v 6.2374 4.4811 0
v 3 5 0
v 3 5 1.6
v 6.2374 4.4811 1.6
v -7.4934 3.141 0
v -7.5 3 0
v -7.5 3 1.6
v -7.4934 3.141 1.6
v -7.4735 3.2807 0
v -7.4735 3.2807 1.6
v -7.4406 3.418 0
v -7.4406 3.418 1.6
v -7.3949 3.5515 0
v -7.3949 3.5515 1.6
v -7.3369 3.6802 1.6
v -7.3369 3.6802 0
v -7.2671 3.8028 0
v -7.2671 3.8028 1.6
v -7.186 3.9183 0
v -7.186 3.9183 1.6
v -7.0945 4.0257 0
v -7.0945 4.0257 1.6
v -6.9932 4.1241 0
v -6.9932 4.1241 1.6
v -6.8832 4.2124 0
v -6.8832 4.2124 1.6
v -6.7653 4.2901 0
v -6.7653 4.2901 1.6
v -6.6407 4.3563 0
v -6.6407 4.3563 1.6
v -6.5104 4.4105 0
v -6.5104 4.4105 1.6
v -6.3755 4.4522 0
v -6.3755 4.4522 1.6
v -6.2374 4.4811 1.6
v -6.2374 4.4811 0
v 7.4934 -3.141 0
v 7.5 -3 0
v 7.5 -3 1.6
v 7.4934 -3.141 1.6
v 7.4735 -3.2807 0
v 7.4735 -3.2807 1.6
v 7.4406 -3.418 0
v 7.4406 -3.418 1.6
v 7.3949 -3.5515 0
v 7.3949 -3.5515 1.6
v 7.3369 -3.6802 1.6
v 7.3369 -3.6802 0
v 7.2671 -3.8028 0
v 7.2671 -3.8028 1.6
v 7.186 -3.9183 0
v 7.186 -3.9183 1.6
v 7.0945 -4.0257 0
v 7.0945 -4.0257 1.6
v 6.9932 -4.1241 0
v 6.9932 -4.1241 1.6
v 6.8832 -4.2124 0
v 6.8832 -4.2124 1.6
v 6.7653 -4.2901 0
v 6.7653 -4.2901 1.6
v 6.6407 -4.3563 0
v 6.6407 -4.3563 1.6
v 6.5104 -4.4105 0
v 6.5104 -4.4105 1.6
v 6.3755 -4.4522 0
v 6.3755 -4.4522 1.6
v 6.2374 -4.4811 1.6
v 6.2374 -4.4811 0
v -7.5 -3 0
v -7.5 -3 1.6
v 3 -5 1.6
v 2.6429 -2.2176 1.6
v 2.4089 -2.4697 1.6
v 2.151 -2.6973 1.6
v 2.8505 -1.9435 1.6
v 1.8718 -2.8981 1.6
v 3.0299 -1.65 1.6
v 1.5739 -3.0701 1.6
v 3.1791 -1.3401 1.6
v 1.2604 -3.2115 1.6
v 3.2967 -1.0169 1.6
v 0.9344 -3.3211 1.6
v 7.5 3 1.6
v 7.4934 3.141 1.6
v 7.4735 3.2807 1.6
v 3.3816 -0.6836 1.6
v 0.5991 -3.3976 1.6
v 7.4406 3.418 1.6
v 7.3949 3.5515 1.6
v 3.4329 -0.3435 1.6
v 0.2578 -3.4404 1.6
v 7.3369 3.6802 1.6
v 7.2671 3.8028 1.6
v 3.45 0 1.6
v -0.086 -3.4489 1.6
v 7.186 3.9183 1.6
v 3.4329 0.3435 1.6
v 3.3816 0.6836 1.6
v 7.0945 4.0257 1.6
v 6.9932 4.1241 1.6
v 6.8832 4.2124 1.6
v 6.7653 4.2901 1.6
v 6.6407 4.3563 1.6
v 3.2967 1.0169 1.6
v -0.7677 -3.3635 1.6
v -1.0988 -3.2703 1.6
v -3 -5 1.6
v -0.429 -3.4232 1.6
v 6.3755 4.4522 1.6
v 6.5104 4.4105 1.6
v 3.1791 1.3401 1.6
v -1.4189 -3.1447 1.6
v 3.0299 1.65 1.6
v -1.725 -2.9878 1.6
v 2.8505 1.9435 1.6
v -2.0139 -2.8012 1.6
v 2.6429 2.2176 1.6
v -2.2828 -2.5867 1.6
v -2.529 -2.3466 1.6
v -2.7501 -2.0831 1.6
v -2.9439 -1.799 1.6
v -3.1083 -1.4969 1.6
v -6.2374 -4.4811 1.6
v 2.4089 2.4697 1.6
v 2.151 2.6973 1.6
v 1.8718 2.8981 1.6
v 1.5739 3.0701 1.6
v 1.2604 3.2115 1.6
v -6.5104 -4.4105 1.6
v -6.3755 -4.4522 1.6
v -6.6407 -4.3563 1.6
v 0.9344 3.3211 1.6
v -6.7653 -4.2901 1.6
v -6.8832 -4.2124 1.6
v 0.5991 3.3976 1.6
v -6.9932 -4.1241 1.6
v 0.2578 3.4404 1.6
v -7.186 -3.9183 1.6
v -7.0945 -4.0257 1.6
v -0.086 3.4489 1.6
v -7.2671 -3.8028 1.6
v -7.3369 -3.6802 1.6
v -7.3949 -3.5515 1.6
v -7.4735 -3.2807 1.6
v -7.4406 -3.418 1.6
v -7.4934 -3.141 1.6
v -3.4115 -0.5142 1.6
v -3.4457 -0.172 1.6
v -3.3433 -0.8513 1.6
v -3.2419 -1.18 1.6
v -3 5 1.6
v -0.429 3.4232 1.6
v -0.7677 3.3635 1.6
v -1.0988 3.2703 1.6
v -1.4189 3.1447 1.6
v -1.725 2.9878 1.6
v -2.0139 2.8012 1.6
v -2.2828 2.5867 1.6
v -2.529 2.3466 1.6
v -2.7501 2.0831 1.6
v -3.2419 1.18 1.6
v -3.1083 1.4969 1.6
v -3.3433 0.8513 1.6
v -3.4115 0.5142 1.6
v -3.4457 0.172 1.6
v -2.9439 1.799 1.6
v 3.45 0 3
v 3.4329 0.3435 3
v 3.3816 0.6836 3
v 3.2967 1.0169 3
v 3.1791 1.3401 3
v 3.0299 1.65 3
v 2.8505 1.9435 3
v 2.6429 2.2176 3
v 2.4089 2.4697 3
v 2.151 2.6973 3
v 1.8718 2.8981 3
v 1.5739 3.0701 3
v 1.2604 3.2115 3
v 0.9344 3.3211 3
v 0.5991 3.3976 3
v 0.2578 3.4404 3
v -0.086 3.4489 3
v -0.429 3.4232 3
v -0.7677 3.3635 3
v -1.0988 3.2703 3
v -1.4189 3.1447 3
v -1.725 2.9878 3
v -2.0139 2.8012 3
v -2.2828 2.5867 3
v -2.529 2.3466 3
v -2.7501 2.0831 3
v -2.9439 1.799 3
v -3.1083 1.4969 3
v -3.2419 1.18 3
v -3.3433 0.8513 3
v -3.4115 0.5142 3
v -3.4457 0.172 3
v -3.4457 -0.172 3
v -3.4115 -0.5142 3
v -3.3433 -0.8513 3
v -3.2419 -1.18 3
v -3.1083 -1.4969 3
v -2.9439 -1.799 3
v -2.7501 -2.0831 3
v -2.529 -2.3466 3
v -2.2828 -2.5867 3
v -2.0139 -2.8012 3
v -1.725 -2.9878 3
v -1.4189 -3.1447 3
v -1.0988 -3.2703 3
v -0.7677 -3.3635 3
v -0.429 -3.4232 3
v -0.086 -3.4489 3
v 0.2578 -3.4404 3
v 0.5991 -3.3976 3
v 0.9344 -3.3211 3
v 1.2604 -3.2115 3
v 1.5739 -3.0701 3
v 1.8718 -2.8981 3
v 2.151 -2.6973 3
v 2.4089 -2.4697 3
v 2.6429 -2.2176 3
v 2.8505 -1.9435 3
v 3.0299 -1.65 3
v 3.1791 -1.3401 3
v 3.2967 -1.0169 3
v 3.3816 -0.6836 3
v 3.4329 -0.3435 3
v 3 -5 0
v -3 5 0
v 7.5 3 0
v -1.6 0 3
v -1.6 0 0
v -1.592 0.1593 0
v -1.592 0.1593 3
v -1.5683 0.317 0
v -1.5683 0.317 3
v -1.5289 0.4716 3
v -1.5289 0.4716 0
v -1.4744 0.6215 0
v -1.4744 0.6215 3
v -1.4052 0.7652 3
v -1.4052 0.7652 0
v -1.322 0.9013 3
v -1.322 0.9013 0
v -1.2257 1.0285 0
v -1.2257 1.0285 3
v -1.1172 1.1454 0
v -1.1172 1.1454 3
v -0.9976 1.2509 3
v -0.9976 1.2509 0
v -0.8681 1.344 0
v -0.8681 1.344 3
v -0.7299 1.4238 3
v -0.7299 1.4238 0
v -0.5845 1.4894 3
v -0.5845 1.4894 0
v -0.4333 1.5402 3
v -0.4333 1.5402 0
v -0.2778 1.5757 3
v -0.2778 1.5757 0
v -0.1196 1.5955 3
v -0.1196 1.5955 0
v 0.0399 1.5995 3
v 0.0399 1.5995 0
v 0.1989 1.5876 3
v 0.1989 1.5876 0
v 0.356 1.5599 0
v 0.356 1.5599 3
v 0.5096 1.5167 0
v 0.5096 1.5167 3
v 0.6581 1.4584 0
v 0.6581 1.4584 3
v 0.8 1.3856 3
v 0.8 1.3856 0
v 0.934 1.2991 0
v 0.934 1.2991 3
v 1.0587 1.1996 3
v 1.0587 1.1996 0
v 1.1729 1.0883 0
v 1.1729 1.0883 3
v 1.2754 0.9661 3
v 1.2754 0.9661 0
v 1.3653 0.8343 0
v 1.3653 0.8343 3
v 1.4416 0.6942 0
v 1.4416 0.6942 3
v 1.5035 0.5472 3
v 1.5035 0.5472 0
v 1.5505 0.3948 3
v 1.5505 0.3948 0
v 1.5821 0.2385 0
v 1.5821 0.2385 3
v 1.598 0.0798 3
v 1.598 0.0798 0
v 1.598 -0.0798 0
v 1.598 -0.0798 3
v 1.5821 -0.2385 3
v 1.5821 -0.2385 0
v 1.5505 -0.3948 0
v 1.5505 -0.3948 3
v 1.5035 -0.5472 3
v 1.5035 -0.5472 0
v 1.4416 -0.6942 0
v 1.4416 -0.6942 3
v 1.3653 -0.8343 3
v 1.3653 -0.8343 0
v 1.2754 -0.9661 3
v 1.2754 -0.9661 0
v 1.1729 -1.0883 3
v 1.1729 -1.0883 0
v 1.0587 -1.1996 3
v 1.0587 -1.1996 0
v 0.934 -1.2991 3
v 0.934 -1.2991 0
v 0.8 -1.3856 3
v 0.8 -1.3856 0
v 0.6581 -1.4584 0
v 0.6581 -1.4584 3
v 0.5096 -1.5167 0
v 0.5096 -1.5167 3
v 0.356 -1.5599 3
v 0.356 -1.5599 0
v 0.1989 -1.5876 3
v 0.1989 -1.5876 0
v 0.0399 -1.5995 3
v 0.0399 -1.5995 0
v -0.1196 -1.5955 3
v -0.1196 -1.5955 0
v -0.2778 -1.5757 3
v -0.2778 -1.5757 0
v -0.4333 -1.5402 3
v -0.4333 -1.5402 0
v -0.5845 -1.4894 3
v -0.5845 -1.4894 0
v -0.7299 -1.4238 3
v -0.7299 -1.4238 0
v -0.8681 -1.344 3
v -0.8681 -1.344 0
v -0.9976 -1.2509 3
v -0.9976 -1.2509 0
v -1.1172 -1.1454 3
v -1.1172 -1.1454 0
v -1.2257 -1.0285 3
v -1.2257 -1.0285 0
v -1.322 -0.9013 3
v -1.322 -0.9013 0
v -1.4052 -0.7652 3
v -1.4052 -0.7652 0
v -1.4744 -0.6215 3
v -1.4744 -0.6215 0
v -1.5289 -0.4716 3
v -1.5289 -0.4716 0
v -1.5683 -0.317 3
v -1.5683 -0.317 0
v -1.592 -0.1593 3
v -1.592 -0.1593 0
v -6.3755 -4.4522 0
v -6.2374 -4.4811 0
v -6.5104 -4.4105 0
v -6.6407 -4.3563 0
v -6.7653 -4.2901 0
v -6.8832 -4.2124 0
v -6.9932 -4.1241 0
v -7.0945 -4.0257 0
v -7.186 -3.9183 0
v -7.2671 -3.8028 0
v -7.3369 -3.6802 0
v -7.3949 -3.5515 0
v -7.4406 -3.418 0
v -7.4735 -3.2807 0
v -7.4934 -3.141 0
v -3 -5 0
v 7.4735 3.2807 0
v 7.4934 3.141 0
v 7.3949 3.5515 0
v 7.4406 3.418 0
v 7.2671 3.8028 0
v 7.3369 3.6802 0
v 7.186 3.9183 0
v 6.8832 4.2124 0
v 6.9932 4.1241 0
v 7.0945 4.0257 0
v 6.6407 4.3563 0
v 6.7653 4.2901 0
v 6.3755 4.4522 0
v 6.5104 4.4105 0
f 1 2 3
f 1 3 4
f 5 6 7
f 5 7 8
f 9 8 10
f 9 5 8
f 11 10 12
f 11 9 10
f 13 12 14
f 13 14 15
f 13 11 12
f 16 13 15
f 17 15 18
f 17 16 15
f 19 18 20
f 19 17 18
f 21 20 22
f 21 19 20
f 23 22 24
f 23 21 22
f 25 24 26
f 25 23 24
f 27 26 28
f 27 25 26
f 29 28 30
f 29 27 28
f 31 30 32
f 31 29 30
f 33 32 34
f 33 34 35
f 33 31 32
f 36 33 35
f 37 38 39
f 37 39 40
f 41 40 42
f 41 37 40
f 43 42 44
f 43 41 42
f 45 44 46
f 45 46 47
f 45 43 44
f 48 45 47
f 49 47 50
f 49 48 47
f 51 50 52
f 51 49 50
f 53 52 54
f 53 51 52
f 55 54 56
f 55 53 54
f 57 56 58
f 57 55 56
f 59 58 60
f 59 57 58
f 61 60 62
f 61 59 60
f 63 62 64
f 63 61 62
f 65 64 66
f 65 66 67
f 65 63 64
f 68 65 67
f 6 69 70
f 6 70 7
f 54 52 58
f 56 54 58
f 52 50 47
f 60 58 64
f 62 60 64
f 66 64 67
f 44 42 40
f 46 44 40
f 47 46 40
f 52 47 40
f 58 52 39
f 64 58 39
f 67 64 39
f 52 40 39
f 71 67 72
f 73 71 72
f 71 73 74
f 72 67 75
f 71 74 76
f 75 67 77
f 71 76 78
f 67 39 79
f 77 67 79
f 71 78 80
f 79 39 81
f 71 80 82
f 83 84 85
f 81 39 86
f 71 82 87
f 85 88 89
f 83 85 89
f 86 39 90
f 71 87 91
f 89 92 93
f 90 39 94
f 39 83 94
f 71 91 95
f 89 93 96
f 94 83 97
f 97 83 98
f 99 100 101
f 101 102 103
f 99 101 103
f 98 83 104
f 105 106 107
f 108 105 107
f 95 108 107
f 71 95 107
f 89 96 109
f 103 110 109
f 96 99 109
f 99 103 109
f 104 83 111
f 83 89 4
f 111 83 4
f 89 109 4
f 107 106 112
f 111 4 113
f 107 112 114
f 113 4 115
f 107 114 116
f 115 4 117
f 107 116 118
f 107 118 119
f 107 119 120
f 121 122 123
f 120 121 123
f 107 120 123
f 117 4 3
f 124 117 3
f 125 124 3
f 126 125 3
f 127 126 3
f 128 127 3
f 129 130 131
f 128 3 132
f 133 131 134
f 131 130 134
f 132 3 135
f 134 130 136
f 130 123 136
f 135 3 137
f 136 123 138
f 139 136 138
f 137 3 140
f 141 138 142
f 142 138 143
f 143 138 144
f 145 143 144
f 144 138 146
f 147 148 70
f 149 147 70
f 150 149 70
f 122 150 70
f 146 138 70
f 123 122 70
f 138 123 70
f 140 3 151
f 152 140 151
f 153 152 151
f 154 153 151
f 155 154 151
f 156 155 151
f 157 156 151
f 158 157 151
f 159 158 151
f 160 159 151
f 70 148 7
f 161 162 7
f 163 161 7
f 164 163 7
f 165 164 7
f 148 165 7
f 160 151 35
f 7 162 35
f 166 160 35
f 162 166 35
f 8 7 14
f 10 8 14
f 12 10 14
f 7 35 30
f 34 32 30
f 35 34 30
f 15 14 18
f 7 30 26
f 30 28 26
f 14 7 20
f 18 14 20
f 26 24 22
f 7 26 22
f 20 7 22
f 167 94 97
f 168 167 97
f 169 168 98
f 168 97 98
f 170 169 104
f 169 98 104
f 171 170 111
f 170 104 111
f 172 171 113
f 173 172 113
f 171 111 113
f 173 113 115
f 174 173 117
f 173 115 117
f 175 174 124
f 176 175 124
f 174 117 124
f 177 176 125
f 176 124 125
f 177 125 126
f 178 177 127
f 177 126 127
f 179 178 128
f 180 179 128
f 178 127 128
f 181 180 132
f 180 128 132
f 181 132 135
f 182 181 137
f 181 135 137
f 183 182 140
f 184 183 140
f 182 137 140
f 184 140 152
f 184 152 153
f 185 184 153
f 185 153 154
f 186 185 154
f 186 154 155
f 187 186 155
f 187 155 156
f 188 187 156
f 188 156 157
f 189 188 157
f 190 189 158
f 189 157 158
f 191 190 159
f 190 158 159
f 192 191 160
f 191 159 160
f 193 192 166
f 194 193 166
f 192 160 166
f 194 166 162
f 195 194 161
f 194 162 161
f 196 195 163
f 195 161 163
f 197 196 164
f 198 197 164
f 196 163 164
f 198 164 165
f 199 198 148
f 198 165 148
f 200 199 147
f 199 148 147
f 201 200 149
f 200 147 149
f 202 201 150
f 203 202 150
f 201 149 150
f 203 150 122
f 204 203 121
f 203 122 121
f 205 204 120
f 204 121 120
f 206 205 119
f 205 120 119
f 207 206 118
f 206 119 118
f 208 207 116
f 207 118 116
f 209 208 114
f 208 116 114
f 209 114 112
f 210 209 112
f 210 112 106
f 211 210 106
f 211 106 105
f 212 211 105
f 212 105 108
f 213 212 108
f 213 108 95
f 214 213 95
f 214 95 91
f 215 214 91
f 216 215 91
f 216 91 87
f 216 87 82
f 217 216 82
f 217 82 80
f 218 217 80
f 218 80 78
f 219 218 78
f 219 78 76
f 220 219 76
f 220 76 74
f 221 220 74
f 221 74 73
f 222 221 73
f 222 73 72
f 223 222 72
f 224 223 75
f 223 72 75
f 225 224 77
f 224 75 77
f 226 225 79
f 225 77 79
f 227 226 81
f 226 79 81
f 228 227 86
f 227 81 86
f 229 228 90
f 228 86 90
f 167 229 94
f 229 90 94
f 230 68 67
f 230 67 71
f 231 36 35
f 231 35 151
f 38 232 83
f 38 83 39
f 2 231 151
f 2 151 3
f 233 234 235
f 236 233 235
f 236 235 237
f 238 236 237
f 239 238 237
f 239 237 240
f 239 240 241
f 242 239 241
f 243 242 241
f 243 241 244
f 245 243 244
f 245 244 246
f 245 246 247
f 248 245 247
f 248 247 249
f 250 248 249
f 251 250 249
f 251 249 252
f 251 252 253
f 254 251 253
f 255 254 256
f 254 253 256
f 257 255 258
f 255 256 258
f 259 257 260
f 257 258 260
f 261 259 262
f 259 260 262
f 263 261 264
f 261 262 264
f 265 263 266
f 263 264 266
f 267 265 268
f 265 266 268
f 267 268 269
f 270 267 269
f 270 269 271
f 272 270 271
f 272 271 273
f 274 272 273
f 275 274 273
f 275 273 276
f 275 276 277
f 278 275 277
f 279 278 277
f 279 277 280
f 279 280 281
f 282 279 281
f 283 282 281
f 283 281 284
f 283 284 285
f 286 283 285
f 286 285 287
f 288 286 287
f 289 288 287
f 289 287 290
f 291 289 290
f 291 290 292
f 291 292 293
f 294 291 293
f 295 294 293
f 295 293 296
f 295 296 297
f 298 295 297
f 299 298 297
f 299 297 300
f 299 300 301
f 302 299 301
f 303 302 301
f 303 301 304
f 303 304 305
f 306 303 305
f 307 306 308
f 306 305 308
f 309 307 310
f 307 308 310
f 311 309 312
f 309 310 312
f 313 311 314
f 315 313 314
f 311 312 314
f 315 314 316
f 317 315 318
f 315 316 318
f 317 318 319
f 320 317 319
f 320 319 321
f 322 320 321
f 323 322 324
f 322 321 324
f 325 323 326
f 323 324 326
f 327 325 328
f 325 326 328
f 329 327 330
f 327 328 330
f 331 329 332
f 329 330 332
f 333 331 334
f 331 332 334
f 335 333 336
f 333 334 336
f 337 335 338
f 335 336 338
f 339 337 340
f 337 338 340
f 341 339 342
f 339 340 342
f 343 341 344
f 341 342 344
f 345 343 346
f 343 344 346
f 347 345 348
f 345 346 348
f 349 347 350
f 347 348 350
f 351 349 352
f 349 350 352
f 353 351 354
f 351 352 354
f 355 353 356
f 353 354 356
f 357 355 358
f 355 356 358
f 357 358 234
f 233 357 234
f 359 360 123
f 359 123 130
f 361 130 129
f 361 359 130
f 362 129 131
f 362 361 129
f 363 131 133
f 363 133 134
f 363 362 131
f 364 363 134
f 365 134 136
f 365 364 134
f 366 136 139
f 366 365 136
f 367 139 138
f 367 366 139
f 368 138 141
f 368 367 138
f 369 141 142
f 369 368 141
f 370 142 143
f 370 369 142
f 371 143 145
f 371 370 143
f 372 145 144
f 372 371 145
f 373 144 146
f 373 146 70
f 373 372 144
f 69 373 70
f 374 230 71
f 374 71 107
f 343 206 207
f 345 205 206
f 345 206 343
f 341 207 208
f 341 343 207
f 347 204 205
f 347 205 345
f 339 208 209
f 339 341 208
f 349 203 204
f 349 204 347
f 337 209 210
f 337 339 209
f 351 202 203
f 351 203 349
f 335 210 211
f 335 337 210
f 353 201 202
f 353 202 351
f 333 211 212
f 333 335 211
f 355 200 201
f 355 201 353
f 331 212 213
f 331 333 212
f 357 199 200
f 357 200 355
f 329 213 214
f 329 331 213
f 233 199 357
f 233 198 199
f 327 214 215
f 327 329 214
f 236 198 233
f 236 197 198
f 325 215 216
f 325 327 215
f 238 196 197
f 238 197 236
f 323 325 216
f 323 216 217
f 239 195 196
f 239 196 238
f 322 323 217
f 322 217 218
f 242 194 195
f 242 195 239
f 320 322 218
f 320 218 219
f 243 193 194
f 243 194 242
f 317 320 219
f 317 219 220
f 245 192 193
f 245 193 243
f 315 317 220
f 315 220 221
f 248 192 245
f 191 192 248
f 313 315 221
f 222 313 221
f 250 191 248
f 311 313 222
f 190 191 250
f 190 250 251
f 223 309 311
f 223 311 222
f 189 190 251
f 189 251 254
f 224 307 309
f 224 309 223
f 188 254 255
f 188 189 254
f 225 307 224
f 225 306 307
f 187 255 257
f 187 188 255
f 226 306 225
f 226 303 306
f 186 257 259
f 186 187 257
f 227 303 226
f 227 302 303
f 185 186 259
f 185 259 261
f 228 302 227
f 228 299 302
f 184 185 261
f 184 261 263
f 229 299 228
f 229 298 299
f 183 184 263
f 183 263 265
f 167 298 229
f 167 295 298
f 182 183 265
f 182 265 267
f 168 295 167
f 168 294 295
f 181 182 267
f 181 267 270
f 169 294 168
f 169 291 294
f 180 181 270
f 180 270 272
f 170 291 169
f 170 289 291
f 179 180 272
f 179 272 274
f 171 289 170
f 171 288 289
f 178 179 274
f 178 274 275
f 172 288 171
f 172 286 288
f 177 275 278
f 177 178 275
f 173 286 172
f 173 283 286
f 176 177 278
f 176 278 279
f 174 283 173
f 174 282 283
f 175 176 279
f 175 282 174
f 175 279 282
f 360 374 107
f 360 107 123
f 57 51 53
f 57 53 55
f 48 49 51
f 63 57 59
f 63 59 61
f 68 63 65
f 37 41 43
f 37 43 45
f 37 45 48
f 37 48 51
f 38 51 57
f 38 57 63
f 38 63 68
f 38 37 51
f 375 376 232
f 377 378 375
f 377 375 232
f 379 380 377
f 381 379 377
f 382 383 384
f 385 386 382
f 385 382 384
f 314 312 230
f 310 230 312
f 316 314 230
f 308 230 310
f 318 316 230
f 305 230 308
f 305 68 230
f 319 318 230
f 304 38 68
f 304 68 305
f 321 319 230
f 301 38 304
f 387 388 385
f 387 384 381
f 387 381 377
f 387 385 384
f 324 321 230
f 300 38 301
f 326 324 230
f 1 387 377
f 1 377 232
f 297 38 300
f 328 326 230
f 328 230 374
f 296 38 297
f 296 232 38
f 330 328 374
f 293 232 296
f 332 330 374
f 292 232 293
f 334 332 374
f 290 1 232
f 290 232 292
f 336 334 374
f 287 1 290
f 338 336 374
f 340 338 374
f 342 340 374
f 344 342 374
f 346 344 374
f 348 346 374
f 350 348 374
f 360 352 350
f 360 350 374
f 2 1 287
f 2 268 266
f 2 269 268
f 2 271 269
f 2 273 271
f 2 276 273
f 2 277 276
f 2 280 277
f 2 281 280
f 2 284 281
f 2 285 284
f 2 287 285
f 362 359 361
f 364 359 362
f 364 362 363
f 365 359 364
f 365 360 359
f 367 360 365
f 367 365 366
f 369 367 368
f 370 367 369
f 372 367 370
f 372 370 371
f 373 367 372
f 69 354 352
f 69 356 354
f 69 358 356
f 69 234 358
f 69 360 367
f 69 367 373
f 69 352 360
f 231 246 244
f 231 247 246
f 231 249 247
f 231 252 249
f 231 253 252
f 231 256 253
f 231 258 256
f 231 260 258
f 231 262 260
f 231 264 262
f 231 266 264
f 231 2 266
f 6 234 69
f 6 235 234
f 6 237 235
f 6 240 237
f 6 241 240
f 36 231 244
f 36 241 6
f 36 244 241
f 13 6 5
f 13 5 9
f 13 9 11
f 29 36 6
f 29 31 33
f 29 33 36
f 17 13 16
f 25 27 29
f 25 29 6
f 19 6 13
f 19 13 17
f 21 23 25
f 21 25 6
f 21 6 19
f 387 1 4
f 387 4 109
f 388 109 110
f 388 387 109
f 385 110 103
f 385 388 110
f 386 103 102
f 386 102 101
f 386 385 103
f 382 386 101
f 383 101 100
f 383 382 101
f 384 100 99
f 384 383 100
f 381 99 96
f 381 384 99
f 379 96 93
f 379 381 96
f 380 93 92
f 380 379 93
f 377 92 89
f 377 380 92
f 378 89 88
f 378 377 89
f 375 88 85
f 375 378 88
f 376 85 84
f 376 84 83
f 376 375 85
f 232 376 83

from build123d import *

# Parameters (mm, degrees)
BOSS_EXTRUDE1_DEPTH   = 1.6
SKETCH2_R             = 3.45
BOSS_EXTRUDE2_DEPTH   = 1.4
M5X0_8_TAPPED_HOLE1_D = 3.2


with BuildPart() as part:
    # Sketch1 → Boss-Extrude1 (new body)
    with BuildSketch(Plane.XY):
        with BuildLine():
            Line((-6.237396753, 4.481095129), (-3, 5))
            Line((-3, 5), (3, 5))
            Line((3, 5), (6.237396753, 4.481095129))
            ThreePointArc((6.237396753, 4.481095129), (7.141511088, 3.973114811), (7.5, 3))
            Line((7.5, 3), (7.5, -3))
            ThreePointArc((7.5, -3), (7.141511088, -3.973114811), (6.237396753, -4.481095129))
            Line((6.237396753, -4.481095129), (3, -5))
            Line((3, -5), (-3, -5))
            Line((-3, -5), (-6.237396753, -4.481095129))
            ThreePointArc((-6.237396753, -4.481095129), (-7.141511088, -3.973114811), (-7.5, -3))
            Line((-7.5, -3), (-7.5, 3))
            ThreePointArc((-7.5, 3), (-7.141511088, 3.973114811), (-6.237396753, 4.481095129))
        make_face()
    extrude(amount=BOSS_EXTRUDE1_DEPTH)

    # Sketch2 → Boss-Extrude2 (add)
    with BuildSketch(Plane.XY.offset(1.6)):
        Circle(SKETCH2_R)
    extrude(amount=BOSS_EXTRUDE2_DEPTH)

    # M5x0.8 Tapped Hole1 (through all)
    with Locations(Plane.XY.offset(3)):
        with Locations((0, 0)):
            Hole(M5X0_8_TAPPED_HOLE1_D / 2)


solid = part.part
